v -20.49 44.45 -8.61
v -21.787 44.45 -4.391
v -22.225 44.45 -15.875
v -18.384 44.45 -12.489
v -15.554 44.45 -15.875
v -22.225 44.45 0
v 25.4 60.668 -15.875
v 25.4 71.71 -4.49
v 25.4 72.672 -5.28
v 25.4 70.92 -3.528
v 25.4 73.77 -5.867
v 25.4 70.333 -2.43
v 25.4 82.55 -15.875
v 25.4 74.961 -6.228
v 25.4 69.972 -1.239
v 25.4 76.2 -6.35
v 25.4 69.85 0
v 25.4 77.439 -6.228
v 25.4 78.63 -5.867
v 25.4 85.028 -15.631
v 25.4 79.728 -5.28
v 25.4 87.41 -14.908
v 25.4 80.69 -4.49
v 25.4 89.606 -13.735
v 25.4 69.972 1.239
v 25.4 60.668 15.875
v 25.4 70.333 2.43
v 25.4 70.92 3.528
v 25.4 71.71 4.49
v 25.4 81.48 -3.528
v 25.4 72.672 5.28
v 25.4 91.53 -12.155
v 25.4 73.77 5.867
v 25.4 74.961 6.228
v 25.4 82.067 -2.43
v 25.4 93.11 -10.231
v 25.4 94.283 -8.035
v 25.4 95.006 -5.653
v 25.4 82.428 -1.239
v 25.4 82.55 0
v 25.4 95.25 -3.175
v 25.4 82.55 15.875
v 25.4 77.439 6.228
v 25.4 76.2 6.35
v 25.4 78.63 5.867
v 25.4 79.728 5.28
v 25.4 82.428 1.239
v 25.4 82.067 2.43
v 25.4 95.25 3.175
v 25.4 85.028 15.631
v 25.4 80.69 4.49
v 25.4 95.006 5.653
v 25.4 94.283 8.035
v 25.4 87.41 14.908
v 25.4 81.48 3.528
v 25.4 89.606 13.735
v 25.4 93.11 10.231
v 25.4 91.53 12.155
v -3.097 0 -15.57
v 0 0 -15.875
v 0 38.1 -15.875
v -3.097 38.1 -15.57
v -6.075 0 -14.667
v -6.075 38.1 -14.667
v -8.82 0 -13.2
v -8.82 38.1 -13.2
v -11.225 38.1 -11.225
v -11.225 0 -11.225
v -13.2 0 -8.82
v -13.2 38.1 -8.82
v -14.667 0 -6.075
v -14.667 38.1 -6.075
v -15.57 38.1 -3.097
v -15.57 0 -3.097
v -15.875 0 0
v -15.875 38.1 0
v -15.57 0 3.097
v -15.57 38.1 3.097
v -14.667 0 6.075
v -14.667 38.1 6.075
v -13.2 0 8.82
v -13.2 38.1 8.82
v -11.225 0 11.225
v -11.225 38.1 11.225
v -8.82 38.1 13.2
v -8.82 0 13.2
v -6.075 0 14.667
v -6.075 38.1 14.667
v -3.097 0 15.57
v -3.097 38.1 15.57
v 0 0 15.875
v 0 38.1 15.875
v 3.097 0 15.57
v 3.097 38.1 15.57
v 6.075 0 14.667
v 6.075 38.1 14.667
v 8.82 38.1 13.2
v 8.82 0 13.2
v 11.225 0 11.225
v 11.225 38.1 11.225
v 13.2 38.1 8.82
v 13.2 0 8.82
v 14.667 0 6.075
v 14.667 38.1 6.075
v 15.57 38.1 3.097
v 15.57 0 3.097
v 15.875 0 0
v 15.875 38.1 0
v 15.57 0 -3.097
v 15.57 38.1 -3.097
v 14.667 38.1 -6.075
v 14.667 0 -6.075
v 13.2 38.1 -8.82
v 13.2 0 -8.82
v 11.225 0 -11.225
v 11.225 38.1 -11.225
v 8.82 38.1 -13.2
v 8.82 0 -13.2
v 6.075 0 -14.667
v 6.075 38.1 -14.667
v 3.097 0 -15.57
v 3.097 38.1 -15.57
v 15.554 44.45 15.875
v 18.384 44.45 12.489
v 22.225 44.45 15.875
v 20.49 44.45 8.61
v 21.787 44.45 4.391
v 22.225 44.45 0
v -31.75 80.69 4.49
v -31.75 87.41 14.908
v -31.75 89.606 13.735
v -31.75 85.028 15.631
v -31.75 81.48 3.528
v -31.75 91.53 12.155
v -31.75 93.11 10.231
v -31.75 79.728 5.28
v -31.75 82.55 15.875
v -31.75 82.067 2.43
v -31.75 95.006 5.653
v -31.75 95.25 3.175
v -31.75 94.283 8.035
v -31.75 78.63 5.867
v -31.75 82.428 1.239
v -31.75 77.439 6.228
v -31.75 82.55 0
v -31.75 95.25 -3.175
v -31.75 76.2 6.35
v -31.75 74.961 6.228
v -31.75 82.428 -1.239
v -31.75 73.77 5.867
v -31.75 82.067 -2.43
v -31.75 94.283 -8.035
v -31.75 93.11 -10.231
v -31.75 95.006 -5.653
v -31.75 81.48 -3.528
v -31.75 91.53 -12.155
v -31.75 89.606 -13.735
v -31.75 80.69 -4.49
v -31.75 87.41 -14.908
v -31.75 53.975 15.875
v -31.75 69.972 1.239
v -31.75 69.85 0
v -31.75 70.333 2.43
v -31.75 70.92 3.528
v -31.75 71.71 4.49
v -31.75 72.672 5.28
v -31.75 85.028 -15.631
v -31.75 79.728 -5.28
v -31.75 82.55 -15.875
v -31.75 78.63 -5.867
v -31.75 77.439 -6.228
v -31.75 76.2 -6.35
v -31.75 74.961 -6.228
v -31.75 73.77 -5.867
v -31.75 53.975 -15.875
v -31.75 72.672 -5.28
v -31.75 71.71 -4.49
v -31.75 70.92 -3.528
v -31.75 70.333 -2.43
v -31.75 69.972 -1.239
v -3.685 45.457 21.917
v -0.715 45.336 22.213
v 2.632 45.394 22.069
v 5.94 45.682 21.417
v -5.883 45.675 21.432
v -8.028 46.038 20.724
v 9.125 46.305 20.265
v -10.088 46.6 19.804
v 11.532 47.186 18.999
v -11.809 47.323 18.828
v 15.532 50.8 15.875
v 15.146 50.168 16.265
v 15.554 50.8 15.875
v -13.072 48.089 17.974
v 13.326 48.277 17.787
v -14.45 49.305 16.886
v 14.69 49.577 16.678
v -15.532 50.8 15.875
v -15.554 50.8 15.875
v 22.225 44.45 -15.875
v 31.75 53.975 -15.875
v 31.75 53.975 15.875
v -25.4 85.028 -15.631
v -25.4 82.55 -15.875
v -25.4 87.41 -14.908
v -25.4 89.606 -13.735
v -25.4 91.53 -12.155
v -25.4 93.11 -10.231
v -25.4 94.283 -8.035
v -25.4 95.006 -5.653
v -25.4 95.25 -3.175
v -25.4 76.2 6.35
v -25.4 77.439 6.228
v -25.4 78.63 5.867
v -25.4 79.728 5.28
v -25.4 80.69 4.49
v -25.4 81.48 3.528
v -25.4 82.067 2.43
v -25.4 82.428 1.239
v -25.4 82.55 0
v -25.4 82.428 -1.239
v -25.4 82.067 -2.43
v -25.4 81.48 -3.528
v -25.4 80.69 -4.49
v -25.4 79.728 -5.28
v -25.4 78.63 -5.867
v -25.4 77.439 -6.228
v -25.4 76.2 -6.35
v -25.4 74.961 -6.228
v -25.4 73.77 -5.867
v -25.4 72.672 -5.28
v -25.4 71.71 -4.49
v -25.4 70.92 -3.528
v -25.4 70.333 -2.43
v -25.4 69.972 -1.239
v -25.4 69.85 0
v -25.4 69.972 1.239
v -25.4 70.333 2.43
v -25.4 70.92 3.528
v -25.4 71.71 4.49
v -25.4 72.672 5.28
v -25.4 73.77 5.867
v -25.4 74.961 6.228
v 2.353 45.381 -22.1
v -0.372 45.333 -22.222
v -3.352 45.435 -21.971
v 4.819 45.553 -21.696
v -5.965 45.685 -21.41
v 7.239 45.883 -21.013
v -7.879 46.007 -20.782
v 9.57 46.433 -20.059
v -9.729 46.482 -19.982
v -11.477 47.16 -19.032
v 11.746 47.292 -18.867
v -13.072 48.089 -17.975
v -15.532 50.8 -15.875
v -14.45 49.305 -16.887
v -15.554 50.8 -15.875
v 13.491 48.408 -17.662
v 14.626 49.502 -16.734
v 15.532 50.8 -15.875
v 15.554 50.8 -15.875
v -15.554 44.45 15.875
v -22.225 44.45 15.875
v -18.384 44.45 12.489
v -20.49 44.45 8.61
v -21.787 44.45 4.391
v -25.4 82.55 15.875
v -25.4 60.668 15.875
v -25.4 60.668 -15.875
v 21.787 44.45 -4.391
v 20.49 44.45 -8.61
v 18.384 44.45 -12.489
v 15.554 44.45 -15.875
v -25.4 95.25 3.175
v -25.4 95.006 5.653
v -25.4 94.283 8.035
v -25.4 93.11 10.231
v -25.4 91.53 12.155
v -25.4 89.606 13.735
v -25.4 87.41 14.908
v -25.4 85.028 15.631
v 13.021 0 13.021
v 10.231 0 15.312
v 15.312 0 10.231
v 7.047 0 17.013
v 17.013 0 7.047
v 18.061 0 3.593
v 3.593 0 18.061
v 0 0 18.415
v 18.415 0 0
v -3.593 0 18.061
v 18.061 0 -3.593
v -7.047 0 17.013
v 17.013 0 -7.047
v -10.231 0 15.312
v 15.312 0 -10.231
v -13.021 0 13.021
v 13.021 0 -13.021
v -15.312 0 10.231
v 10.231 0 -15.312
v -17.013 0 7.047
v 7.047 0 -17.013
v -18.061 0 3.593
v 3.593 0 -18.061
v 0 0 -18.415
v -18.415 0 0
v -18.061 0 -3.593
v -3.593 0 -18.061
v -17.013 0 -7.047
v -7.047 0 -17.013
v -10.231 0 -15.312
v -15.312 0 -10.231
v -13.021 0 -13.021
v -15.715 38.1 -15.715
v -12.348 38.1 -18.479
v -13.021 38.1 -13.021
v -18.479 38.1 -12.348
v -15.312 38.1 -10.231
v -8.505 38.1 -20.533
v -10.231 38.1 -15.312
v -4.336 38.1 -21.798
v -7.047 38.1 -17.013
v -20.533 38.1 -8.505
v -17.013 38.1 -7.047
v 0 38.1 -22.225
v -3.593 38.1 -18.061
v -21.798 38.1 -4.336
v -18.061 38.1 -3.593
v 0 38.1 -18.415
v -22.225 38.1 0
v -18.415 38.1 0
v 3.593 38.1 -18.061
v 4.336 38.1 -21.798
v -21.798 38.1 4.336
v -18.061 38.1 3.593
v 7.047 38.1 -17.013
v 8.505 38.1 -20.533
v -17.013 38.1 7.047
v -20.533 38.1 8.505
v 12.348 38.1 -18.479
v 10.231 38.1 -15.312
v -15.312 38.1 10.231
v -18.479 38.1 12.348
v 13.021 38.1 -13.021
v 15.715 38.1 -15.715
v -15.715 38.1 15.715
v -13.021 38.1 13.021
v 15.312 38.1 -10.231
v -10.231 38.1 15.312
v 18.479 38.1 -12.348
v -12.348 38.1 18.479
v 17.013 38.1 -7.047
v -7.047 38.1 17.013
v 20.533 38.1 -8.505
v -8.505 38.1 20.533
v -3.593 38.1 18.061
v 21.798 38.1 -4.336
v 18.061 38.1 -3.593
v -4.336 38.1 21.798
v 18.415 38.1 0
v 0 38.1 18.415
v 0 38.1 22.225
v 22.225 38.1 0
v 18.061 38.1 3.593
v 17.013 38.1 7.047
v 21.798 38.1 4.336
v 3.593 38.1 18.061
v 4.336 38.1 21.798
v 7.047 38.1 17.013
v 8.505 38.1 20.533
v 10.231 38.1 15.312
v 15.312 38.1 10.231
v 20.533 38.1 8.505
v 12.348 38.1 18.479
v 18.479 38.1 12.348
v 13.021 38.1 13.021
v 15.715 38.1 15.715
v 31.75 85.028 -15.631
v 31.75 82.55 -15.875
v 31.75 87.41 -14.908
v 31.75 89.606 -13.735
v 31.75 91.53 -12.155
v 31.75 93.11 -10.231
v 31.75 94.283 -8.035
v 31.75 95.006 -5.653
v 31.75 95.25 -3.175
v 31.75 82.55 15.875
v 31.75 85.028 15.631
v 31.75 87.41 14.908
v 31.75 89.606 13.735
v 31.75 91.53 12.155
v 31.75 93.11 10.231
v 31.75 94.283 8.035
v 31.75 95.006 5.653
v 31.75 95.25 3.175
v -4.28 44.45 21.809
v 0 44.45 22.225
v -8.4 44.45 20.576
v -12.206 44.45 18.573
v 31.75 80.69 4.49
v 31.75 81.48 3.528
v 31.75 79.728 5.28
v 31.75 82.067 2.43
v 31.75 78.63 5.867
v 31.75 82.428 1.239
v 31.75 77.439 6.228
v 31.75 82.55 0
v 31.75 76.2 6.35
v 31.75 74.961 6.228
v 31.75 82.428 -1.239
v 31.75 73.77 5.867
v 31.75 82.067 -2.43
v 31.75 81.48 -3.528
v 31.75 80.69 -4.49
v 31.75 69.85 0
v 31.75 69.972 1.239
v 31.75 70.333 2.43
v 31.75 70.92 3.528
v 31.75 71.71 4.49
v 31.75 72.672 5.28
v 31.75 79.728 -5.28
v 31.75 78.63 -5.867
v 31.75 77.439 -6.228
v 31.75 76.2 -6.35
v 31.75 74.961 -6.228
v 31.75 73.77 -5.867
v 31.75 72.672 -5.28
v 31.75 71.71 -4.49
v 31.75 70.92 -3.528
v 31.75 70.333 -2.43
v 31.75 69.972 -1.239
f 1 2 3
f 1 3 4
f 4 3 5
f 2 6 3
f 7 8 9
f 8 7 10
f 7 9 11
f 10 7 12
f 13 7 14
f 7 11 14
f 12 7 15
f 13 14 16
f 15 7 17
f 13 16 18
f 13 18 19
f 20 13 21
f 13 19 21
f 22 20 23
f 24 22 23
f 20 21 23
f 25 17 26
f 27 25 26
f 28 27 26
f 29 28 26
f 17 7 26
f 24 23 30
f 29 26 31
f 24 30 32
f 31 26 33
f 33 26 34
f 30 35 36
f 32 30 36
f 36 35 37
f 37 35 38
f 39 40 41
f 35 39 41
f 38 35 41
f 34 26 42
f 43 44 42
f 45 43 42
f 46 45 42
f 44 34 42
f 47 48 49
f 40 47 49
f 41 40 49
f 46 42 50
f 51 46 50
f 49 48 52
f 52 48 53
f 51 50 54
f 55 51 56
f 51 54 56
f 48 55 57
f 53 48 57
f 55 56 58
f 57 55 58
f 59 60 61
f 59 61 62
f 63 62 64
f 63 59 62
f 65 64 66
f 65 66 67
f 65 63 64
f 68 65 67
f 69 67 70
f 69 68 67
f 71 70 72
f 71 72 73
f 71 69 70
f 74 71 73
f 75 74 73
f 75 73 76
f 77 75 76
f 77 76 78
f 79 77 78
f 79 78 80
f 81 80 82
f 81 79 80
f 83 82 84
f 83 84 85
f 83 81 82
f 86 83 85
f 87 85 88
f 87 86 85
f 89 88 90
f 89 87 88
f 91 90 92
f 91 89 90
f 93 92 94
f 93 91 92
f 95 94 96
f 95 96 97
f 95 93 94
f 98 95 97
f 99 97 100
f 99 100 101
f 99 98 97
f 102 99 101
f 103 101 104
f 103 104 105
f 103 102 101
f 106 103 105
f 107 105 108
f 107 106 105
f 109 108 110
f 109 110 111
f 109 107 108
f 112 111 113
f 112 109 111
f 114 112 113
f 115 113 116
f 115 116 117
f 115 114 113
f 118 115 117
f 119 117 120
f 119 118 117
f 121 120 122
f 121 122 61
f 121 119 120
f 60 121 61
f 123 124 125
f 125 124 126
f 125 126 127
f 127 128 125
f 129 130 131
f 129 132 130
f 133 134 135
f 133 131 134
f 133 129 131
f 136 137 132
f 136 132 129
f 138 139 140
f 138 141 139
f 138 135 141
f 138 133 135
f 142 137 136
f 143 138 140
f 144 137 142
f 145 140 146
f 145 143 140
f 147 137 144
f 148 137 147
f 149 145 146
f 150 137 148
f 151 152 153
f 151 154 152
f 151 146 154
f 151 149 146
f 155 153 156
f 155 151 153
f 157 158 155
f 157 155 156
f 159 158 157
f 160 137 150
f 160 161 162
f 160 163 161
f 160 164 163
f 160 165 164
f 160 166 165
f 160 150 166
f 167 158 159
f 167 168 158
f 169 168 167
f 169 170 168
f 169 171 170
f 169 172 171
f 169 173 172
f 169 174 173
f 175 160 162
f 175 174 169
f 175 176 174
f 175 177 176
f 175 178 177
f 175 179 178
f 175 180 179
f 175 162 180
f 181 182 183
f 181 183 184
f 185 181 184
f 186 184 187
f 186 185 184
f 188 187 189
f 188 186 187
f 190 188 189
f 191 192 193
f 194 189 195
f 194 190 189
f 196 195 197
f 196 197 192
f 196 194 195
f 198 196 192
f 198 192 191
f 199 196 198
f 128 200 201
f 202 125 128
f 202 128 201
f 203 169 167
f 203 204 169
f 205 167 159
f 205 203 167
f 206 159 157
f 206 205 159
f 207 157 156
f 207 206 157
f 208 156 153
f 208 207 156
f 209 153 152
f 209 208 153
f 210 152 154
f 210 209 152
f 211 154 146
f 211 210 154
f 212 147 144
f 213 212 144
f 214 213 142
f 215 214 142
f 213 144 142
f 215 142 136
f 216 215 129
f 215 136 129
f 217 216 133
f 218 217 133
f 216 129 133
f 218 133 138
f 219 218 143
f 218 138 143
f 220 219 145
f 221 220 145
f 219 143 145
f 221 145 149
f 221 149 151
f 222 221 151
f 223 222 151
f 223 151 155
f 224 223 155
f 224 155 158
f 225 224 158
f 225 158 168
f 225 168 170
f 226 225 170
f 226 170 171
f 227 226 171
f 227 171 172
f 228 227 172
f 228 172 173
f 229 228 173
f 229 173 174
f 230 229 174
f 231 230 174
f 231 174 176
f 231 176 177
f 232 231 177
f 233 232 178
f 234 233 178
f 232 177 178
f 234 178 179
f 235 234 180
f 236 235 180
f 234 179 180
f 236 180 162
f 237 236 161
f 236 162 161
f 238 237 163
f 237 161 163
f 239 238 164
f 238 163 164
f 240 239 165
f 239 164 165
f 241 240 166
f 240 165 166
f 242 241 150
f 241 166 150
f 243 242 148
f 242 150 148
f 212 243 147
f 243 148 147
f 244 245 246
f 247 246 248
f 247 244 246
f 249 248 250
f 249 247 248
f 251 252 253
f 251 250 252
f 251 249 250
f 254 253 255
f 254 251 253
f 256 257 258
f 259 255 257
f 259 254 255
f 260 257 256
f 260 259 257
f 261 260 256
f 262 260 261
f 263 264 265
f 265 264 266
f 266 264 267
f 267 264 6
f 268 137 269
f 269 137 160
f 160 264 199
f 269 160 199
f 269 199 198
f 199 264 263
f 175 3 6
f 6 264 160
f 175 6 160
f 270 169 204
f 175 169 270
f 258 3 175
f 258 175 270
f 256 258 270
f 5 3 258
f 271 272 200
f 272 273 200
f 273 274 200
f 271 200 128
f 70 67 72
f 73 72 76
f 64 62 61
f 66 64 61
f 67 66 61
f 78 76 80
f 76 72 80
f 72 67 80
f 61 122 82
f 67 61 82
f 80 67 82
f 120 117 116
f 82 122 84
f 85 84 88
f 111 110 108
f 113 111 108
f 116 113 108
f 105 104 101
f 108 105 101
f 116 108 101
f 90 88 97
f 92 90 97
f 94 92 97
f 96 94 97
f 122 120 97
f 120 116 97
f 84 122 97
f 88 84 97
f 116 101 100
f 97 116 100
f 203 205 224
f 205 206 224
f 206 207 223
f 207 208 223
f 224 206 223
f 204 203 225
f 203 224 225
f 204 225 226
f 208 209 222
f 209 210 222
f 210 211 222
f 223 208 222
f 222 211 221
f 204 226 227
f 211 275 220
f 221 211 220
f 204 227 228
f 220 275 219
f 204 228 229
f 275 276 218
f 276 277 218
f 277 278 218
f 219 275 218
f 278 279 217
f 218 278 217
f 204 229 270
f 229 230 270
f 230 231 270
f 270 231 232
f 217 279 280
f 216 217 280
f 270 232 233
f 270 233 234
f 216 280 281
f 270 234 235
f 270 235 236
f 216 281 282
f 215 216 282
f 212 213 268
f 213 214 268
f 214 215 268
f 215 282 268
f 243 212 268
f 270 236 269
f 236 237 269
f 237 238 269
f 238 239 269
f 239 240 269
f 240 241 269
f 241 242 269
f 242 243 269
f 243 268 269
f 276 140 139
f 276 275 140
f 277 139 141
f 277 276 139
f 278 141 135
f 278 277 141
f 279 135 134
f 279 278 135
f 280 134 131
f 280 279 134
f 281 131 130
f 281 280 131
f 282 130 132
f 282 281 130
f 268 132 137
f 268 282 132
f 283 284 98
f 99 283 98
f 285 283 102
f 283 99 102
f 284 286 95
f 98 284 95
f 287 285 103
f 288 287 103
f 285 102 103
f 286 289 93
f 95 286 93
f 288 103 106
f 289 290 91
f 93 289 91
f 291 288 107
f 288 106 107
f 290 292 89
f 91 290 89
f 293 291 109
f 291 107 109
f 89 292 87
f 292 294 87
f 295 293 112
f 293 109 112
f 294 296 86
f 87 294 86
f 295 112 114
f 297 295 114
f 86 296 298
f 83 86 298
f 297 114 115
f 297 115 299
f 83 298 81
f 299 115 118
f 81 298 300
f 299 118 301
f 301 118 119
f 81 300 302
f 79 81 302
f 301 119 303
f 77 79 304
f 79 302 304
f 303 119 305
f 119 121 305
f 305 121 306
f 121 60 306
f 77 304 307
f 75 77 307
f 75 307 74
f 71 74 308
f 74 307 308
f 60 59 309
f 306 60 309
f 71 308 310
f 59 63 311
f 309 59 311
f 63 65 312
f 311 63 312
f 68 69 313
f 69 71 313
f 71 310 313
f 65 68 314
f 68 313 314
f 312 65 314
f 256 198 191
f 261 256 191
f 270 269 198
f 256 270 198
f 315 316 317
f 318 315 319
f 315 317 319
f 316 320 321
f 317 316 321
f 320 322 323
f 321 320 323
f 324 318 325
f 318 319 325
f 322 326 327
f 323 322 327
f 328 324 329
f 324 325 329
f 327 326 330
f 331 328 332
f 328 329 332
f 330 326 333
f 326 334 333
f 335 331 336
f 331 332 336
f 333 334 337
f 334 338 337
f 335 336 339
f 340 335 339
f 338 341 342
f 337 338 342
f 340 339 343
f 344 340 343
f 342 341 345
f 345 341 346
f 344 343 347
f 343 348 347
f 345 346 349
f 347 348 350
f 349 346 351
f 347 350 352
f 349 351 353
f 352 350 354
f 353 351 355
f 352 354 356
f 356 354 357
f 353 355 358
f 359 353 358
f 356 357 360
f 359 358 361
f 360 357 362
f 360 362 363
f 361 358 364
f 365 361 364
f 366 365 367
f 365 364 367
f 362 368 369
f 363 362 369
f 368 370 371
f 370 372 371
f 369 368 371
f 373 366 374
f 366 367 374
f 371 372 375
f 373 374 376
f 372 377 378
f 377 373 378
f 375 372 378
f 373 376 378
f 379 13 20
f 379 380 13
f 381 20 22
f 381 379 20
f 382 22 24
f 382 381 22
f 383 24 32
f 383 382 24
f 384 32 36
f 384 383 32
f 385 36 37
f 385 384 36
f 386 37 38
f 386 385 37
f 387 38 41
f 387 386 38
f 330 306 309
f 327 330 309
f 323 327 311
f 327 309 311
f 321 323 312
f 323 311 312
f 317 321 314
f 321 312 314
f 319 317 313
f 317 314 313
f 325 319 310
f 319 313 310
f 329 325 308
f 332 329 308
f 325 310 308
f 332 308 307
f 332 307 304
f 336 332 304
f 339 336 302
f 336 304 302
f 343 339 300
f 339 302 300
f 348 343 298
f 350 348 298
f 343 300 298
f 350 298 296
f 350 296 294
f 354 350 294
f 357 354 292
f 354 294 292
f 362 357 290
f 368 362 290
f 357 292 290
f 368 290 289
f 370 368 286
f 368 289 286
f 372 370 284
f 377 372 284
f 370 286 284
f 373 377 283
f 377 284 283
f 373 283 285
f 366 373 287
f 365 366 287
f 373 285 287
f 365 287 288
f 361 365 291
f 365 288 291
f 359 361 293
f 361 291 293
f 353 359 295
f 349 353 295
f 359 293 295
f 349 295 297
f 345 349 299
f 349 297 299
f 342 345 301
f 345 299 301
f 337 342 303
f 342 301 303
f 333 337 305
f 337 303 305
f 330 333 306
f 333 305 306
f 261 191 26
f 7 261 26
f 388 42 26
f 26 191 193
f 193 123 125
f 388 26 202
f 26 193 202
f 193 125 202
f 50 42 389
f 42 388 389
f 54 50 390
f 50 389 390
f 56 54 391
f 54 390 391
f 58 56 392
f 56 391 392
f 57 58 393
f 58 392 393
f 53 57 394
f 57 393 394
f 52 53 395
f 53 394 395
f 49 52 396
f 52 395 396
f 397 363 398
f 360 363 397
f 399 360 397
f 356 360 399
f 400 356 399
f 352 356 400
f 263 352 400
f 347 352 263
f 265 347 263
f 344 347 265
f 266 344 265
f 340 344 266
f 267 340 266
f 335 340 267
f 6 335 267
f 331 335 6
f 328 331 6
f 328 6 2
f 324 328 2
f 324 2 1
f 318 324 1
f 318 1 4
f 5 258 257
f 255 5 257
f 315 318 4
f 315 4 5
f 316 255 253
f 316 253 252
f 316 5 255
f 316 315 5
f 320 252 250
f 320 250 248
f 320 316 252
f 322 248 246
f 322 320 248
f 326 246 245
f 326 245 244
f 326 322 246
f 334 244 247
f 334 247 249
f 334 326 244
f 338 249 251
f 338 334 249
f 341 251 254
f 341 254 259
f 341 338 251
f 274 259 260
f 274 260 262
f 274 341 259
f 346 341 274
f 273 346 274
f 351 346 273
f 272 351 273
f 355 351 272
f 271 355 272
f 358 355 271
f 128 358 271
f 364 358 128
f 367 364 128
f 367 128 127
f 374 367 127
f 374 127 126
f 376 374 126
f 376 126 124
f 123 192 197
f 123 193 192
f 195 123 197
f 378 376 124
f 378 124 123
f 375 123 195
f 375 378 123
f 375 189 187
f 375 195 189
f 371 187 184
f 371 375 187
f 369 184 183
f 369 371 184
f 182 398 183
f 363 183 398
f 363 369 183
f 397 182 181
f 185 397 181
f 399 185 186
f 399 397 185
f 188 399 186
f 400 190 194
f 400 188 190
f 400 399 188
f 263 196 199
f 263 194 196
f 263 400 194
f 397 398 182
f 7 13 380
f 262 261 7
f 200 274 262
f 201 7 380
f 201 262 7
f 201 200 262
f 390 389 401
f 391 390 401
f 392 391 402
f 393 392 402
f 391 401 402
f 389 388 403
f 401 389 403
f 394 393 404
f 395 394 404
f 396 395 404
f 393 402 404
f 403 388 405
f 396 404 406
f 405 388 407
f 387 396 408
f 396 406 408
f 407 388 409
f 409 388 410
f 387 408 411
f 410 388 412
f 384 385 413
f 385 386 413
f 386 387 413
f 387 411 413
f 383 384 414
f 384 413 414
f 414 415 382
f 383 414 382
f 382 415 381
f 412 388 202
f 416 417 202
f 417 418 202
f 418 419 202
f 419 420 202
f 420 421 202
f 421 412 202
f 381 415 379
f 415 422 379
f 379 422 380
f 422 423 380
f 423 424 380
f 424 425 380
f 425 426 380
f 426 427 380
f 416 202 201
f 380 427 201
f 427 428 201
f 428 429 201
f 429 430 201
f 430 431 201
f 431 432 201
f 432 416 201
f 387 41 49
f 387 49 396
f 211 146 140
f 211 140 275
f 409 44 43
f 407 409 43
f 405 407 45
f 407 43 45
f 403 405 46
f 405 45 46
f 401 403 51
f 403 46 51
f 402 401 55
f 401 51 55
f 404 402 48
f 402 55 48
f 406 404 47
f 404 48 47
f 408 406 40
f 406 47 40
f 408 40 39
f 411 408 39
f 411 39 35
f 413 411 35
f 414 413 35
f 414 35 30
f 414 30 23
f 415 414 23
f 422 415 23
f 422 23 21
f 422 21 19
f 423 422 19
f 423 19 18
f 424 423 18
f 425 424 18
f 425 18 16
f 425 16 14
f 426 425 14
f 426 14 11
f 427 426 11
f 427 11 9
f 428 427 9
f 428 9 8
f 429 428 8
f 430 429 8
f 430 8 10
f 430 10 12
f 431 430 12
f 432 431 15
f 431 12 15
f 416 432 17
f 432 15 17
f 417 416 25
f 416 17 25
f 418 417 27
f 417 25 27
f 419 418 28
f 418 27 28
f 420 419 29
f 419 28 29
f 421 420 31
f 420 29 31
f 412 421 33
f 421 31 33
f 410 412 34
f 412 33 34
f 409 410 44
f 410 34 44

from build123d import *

# Parameters (mm, degrees)
SKETCH2_R           = 18.415
SKETCH2_R_2         = 15.875
BOSS_EXTRUDE1_DEPTH = 38.1
SKETCH3_R           = 22.225
BOSS_EXTRUDE2_DEPTH = 6.35
SKETCH5_W           = 63.5
SKETCH5_H           = 31.75
BOSS_EXTRUDE3_DEPTH = 50.8
CUT_EXTRUDE2_DEPTH  = 50.8
FILLET1_R           = 12.7
SKETCH9_R           = 6.35
CUT_EXTRUDE3_DEPTH  = 117.613734719
FILLET2_R           = 12.7


with BuildPart() as part:
    # Sketch2 → Boss-Extrude1 (new body)
    with BuildSketch(Plane(origin=(0, 0, 0), x_dir=(1, 0, 0), z_dir=(0, 1, 0))):
        with Locations(Location((0, 0, 0), (0, 0, 90))):
            Circle(SKETCH2_R)
        with Locations(Location((0, 0, 0), (0, 0, 90))):
            Circle(SKETCH2_R_2, mode=Mode.SUBTRACT)
    extrude(amount=BOSS_EXTRUDE1_DEPTH)

    # Sketch3 → Boss-Extrude2 (add)
    with BuildSketch(Plane(origin=(0, 38.1, 0), x_dir=(1, 0, 0), z_dir=(0, 1, 0))):
        with Locations(Location((0, 0, 0), (0, 0, 270))):
            Circle(SKETCH3_R)
    extrude(amount=BOSS_EXTRUDE2_DEPTH)

    # Sketch5 → Boss-Extrude3 (add)
    with BuildSketch(Plane(origin=(0, 44.45, 0), x_dir=(1, 0, 0), z_dir=(0, 1, 0))):
        Rectangle(SKETCH5_W, SKETCH5_H)
    extrude(amount=BOSS_EXTRUDE3_DEPTH)

    # Sketch7 → Cut-Extrude2 (cut)
    with BuildSketch(Plane.XY.offset(15.875)):
        Polygon((25.4, 95.25), (-25.4, 95.25), (-25.4, 60.667652482), (-15.532347518, 50.8), (15.532347518, 50.8), (25.4, 60.667652482), align=None)
        Polygon((-22.225, 44.45), (-31.75, 53.975), (-31.75, 44.45), align=None)
        Polygon((22.225, 44.45), (31.75, 53.975), (31.75, 44.45), align=None)
    extrude(amount=-CUT_EXTRUDE2_DEPTH, mode=Mode.SUBTRACT)

    # Fillet1
    fillet1_edges = [part.edges().sort_by_distance(p)[0] for p in [
        (28.575, 95.25, -15.875),
        (-28.575, 95.25, 15.875),
        (-28.575, 95.25, -15.875),
        (28.575, 95.25, 15.875),
    ]]
    fillet(fillet1_edges, radius=FILLET1_R)

    # Sketch9 → Cut-Extrude3 (cut, through all)
    with BuildSketch(Plane.ZY.offset(31.75)):
        with Locations((0, 76.2)):
            Circle(SKETCH9_R)
    extrude(amount=-CUT_EXTRUDE3_DEPTH, mode=Mode.SUBTRACT)

    # Fillet2
    # the kernel refuses this fillet: 12.7 mm, written as the material it adds along each edge
    with BuildSketch(Plane(origin=(-43.050566437, 44.45, 15.875), x_dir=(0, 1, 0), z_dir=(1, 0, 0))) as fillet2_piece_1_section:
        with BuildLine():
            CenterArc((12.7, 10.998522628), FILLET2_R, 180, 60)
            Line((0, 10.998522628), (0, 0))
            Line((0, 0), (6.35, 0))
        make_face()
    fillet2_piece_1 = extrude(amount=86.101132874, mode=Mode.PRIVATE)
    fillet2_piece_1 = fillet2_piece_1 & Plane(origin=(0, 49.09130813, 0), x_dir=(0, 0, 1), z_dir=(0, -1, 0)) * Cylinder(22.225, 217, mode=Mode.PRIVATE)
    add(fillet2_piece_1)
    with BuildSketch(Plane(origin=(43.050566437, 44.45, -15.875), x_dir=(0, 1, 0), z_dir=(-1, 0, 0))) as fillet2_piece_2_section:
        with BuildLine():
            CenterArc((12.7, 10.998522628), FILLET2_R, 180, 60)
            Line((0, 10.998522628), (0, 0))
            Line((0, 0), (6.35, 0))
        make_face()
    fillet2_piece_2 = extrude(amount=86.101132874, mode=Mode.PRIVATE)
    fillet2_piece_2 = fillet2_piece_2 & Plane(origin=(0, 49.09130813, 0), x_dir=(0, 0, 1), z_dir=(0, -1, 0)) * Cylinder(22.225, 217, mode=Mode.PRIVATE)
    add(fillet2_piece_2)


solid = part.part
